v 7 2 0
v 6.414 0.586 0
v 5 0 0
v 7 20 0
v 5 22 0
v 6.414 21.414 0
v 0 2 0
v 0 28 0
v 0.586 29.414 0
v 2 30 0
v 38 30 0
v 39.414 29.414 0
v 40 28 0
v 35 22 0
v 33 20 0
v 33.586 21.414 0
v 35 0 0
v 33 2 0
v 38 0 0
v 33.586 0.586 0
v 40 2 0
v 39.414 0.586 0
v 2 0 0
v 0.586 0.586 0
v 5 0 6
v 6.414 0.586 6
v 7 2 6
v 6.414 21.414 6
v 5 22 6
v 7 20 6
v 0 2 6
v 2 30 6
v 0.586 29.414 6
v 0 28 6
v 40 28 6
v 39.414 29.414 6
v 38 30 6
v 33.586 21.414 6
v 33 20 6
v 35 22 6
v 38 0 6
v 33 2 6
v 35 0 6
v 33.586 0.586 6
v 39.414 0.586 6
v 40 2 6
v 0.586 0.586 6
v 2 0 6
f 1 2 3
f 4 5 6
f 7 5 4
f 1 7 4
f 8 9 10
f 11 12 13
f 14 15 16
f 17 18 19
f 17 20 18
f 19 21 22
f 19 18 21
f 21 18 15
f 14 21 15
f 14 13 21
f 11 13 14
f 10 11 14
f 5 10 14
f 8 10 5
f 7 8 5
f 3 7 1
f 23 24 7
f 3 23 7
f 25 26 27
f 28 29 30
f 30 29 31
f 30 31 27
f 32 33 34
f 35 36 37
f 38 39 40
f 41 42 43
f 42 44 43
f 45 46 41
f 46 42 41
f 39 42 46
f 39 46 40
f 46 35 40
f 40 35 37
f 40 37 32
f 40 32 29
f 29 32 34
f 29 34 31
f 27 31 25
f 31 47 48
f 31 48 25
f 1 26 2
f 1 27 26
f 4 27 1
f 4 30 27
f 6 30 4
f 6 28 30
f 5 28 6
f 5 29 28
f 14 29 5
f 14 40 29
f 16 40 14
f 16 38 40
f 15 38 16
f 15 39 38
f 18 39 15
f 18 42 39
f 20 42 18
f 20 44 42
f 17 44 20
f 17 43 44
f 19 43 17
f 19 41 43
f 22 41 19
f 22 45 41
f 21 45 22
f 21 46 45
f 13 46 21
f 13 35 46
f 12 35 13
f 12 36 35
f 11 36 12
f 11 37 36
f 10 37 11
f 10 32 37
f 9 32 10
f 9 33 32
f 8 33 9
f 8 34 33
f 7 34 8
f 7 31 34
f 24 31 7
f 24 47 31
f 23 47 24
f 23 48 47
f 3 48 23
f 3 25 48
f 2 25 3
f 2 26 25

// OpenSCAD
$fn = 32;

// ----------------------------------------------------------------------
// Clip blank: staple clip, 6 mm thick
// ----------------------------------------------------------------------

// --- parameters (mm) ---
profile_height = 6;       // extrusion height
profile_points = 24;      // points of the closed outline

profile = [[0, 2], [0.586, 0.586], [2, 0], [5, 0], [6.414, 0.586], [7, 2], [7, 20], [6.414, 21.414], [5, 22], [35, 22], [33.586, 21.414], [33, 20], [33, 2], [33.586, 0.586], [35, 0], [38, 0], [39.414, 0.586], [40, 2], [40, 28], [39.414, 29.414], [38, 30], [2, 30], [0.586, 29.414], [0, 28]];  // single closed polygon, 24 points, counter clockwise

// --- the one profile operation ---
linear_extrude(height = profile_height) polygon(points = profile);
